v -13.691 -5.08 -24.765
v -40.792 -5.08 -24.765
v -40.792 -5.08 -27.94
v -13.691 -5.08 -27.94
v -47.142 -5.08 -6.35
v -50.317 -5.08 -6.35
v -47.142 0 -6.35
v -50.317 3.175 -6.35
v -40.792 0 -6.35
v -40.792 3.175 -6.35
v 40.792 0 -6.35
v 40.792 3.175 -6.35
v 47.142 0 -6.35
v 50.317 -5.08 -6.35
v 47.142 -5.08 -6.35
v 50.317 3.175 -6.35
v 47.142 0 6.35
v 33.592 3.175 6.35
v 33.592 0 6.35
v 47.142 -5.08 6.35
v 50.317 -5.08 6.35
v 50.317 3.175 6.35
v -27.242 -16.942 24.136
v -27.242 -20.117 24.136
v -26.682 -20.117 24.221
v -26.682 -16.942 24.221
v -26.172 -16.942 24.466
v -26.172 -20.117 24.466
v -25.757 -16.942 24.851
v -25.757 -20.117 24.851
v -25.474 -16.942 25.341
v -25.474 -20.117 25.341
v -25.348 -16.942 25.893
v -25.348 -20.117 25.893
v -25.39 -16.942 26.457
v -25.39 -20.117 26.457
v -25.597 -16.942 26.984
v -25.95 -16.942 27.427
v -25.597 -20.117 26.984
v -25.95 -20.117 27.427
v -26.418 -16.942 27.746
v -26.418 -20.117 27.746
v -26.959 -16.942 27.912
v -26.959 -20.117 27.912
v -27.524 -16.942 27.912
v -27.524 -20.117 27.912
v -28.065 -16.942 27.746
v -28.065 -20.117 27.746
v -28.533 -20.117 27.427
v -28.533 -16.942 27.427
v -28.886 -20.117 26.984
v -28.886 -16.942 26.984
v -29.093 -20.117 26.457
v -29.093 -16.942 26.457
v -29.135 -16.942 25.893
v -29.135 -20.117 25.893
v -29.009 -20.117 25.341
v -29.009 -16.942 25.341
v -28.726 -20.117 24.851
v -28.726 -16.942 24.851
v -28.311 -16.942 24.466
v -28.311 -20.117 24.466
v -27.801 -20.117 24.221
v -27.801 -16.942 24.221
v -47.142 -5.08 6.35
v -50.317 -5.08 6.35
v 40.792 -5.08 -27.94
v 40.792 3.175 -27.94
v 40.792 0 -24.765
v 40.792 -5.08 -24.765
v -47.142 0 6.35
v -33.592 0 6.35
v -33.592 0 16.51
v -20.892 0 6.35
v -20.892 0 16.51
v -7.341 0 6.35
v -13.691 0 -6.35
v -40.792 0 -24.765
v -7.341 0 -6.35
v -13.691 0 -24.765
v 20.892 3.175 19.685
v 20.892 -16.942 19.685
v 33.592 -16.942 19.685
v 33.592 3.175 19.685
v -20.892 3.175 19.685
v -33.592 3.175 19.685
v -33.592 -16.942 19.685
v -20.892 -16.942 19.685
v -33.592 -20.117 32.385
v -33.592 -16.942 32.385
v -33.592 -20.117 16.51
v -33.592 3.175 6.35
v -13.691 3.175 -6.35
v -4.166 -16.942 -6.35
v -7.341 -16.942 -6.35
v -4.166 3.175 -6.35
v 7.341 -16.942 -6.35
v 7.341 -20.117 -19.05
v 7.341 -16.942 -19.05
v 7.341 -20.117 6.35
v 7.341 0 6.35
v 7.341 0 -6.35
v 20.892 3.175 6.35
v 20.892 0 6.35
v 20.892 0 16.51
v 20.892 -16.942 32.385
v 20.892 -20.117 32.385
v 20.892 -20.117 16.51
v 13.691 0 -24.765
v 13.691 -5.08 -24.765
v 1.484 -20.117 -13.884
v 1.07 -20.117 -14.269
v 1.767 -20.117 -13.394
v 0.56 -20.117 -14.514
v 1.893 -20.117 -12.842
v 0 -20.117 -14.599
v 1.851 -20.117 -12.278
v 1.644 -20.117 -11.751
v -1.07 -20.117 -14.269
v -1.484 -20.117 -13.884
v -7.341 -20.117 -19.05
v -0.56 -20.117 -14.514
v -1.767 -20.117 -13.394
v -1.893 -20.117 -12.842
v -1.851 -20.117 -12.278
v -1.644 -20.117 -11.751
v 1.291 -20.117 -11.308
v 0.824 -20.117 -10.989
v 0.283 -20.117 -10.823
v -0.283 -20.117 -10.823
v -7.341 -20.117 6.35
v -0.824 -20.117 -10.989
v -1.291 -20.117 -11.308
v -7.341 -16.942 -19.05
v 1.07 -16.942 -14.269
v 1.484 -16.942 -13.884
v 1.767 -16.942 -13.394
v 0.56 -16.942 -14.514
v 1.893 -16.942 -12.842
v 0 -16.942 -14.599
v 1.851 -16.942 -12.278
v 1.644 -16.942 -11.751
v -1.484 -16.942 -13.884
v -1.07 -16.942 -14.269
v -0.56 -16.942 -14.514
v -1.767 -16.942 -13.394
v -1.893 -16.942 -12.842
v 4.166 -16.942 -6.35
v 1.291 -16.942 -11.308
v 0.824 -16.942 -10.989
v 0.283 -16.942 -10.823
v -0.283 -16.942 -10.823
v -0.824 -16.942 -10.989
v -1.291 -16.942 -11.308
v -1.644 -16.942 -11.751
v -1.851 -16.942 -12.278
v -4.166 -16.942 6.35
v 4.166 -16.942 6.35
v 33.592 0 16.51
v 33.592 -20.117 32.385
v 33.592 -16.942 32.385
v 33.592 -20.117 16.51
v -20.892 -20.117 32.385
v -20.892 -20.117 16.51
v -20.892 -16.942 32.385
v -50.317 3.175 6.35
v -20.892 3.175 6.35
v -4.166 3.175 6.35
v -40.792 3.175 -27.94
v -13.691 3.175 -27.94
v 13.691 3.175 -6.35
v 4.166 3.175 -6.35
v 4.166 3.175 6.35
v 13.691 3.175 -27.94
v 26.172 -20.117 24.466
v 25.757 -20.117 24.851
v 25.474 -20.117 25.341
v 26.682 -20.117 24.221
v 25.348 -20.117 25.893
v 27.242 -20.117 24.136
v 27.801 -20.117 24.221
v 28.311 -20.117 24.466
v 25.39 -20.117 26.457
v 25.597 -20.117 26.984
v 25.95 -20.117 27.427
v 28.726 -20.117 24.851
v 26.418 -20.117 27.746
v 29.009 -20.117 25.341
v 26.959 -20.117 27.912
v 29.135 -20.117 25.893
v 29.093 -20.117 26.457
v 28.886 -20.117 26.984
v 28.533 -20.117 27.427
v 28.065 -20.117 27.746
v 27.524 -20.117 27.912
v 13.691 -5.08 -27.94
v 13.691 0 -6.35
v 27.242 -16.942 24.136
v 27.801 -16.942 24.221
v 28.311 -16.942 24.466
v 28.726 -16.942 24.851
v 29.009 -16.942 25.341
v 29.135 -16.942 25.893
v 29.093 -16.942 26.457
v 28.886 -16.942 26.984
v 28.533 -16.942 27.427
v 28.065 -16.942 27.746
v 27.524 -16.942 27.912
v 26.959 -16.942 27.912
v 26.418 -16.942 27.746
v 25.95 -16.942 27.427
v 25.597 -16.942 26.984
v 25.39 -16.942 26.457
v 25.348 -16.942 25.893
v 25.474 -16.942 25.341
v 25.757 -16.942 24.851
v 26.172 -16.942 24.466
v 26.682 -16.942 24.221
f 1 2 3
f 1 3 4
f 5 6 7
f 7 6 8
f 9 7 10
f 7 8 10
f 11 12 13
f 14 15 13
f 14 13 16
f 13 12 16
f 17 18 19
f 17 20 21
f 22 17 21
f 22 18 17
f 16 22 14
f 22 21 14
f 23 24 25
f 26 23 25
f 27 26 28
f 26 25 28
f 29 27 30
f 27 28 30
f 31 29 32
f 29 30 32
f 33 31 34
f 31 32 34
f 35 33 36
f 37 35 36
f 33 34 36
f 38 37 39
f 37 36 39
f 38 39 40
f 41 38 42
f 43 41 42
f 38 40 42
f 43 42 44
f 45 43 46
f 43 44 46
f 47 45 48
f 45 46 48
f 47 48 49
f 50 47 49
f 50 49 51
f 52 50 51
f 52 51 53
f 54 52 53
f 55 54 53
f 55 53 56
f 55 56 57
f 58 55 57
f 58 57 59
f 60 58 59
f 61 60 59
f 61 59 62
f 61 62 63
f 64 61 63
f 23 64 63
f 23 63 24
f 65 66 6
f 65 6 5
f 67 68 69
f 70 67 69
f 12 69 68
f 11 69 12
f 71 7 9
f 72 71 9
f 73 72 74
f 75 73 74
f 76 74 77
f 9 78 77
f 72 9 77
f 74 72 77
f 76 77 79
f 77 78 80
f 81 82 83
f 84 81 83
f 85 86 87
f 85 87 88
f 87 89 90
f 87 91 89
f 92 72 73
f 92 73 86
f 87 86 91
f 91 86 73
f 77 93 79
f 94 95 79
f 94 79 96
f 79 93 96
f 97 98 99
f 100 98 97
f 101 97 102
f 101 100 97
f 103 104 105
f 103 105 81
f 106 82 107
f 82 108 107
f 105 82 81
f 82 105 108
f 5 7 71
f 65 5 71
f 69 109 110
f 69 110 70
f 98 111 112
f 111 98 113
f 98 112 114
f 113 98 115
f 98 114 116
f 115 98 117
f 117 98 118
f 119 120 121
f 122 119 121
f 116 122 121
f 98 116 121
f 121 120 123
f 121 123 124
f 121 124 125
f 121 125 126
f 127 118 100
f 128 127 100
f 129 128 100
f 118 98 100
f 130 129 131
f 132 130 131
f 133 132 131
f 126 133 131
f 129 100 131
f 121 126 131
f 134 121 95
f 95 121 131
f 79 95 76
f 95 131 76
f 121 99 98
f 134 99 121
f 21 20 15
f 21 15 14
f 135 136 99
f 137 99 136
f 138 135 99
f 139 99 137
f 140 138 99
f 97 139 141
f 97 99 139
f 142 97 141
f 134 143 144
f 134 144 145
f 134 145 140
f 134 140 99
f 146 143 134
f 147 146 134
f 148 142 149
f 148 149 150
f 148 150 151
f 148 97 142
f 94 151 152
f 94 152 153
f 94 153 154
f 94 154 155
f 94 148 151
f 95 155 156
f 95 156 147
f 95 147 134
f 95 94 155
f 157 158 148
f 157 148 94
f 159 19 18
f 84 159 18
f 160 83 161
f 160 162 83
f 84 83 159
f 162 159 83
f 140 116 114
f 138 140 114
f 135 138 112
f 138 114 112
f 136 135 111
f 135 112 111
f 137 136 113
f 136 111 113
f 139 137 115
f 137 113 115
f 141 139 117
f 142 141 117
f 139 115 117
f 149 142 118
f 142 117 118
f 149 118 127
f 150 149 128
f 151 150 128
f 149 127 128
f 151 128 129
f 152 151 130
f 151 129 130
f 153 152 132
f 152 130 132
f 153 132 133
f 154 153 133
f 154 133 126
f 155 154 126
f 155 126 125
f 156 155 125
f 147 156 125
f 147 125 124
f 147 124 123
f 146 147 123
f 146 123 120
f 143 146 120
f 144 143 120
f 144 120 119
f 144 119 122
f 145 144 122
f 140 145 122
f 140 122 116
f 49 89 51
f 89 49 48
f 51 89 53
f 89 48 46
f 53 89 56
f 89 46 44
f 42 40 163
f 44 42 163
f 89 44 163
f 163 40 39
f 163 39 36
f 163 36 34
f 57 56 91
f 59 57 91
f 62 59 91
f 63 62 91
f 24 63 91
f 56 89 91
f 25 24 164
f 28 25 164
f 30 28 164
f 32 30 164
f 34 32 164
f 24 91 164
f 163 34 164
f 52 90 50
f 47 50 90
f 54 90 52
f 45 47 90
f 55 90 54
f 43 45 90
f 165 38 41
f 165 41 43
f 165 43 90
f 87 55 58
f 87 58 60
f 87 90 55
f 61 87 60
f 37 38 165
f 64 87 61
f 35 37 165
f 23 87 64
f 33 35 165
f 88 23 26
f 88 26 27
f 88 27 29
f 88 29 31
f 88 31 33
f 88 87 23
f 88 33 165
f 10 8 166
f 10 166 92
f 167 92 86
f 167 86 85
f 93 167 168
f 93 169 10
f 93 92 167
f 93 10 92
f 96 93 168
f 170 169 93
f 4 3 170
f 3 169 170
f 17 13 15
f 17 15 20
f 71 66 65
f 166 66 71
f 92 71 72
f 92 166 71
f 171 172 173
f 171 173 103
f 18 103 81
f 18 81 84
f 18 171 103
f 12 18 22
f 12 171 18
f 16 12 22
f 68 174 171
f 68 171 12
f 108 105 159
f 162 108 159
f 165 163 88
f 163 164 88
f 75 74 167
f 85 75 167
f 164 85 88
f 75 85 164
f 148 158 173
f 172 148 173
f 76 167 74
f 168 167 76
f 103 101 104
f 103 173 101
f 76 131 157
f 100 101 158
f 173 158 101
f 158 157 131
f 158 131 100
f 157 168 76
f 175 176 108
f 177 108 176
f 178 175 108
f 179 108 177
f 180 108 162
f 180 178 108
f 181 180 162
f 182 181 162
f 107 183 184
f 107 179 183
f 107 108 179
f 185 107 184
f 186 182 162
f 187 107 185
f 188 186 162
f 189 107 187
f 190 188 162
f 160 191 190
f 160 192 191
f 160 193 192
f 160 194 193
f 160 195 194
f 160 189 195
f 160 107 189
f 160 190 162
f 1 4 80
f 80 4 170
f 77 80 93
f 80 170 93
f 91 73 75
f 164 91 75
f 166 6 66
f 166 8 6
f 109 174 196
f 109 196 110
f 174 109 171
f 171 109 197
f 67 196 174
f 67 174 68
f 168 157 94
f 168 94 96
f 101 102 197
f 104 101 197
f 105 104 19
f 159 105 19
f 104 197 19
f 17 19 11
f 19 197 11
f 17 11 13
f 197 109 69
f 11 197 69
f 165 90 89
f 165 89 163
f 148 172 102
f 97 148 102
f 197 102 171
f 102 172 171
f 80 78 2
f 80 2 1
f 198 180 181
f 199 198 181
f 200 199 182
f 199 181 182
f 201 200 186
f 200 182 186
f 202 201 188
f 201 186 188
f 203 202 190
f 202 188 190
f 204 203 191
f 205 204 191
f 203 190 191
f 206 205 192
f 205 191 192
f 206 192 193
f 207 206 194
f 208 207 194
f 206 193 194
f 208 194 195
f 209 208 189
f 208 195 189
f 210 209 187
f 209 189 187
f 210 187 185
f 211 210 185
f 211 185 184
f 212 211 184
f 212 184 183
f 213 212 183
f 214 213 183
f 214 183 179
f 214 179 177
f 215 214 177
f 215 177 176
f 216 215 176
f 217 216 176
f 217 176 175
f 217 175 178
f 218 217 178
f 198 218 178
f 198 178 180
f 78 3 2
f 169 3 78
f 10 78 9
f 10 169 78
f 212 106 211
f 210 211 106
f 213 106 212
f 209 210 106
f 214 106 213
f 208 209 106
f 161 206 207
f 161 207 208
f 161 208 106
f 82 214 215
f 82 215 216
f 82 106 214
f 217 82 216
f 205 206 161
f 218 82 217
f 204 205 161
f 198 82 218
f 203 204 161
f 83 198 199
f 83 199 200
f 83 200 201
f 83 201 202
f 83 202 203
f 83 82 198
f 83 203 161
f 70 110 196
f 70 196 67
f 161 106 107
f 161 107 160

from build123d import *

# Parameters (mm, degrees)
SKETCH1_W             = 100.6348
SKETCH1_H             = 12.7
BOSS_EXTRUDE1_DEPTH   = 3.175
SKETCH2_W             = 3.175
SKETCH2_H             = 12.7
BOSS_EXTRUDE2_DEPTH   = 5.08
SKETCH3_W             = 14.6812
SKETCH3_H             = 12.7
BOSS_EXTRUDE3_DEPTH   = 20.1168
SKETCH4_W             = 8.3312
SKETCH4_H             = 20.1168
CUT_EXTRUDE1_DEPTH    = 20.1168
SKETCH5_W             = 27.1018
SKETCH5_H             = 21.59
BOSS_EXTRUDE4_DEPTH   = 3.175
SKETCH6_W             = 27.1018
SKETCH6_H             = 3.175
BOSS_EXTRUDE5_DEPTH   = 5.08
SKETCH7_W             = 12.7
SKETCH7_H             = 13.335
BOSS_EXTRUDE6_DEPTH   = 3.175
SKETCH8_W             = 12.7
SKETCH8_H             = 3.175
BOSS_EXTRUDE7_DEPTH   = 20.1168
SKETCH9_W             = 12.7
SKETCH9_H             = 3.175
BOSS_EXTRUDE8_DEPTH   = 12.7
SKETCH10_W            = 14.6812
SKETCH10_H            = 3.175
BOSS_EXTRUDE9_DEPTH   = 12.7
F_6_CLEARANCE_HOLE1_D = 3.7973


with BuildPart() as part:
    # Sketch1 → Boss-Extrude1 (new body)
    with BuildSketch(Plane(origin=(0, 0, 0), x_dir=(1, 0, 0), z_dir=(0, 1, 0))):
        Rectangle(SKETCH1_W, SKETCH1_H)
    extrude(amount=BOSS_EXTRUDE1_DEPTH)

    # Sketch2 → Boss-Extrude2 (add)
    with BuildSketch(Plane.XZ):
        with Locations((-48.7299, 0)):
            Rectangle(SKETCH2_W, SKETCH2_H)
        with Locations((48.7299, 0)):
            Rectangle(SKETCH2_W, SKETCH2_H)
    extrude(amount=BOSS_EXTRUDE2_DEPTH)

    # Sketch3 → Boss-Extrude3 (add)
    with BuildSketch(Plane.XZ):
        Rectangle(SKETCH3_W, SKETCH3_H)
    extrude(amount=BOSS_EXTRUDE3_DEPTH)

    # Sketch4 → Cut-Extrude1 (cut)
    with BuildSketch(Plane.XY.offset(6.35)):
        with Locations((0, -6.8834)):
            Rectangle(SKETCH4_W, SKETCH4_H)
    extrude(amount=-CUT_EXTRUDE1_DEPTH, mode=Mode.SUBTRACT)

    # Sketch5 → Boss-Extrude4 (add)
    with BuildSketch(Plane.XZ):
        with Locations((-27.2415, -17.145)):
            Rectangle(SKETCH5_W, SKETCH5_H)
        with Locations((27.2415, -17.145)):
            Rectangle(SKETCH5_W, SKETCH5_H)
    extrude(amount=-BOSS_EXTRUDE4_DEPTH)

    # Sketch6 → Boss-Extrude5 (add)
    with BuildSketch(Plane.XZ):
        with Locations((-27.2415, -26.3525)):
            Rectangle(SKETCH6_W, SKETCH6_H)
        with Locations((27.2415, -26.3525)):
            Rectangle(SKETCH6_W, SKETCH6_H)
    extrude(amount=BOSS_EXTRUDE5_DEPTH)

    # Sketch7 → Boss-Extrude6 (add)
    with BuildSketch(Plane.XZ):
        with Locations((-27.2415, 13.0175)):
            Rectangle(SKETCH7_W, SKETCH7_H)
        with Locations((27.2415, 13.0175)):
            Rectangle(SKETCH7_W, SKETCH7_H)
    extrude(amount=-BOSS_EXTRUDE6_DEPTH)

    # Sketch8 → Boss-Extrude7 (add)
    with BuildSketch(Plane.XZ):
        with Locations((-27.2415, 18.0975)):
            Rectangle(SKETCH8_W, SKETCH8_H)
        with Locations((27.2415, 18.0975)):
            Rectangle(SKETCH8_W, SKETCH8_H)
    extrude(amount=BOSS_EXTRUDE7_DEPTH)

    # Sketch9 → Boss-Extrude8 (add)
    with BuildSketch(Plane.XY.offset(19.685)):
        with Locations((-27.2415, -18.5293)):
            Rectangle(SKETCH9_W, SKETCH9_H)
        with Locations((27.2415, -18.5293)):
            Rectangle(SKETCH9_W, SKETCH9_H)
    extrude(amount=BOSS_EXTRUDE8_DEPTH)

    # Sketch10 → Boss-Extrude9 (add)
    with BuildSketch(Plane(origin=(0, 0, -6.35), x_dir=(-1, 0, 0), z_dir=(0, 0, -1))):
        with Locations((0, -18.5293)):
            Rectangle(SKETCH10_W, SKETCH10_H)
    extrude(amount=BOSS_EXTRUDE9_DEPTH)

    # #6 Clearance Hole1 (through all)
    with Locations(Plane(origin=(0, -16.9418, -12.7), x_dir=(0, 0, 1), z_dir=(0, 1, 0))):
        with Locations((0, 0), (38.735, -27.2415), (38.735, 27.2415)):
            Hole(F_6_CLEARANCE_HOLE1_D / 2)


solid = part.part
